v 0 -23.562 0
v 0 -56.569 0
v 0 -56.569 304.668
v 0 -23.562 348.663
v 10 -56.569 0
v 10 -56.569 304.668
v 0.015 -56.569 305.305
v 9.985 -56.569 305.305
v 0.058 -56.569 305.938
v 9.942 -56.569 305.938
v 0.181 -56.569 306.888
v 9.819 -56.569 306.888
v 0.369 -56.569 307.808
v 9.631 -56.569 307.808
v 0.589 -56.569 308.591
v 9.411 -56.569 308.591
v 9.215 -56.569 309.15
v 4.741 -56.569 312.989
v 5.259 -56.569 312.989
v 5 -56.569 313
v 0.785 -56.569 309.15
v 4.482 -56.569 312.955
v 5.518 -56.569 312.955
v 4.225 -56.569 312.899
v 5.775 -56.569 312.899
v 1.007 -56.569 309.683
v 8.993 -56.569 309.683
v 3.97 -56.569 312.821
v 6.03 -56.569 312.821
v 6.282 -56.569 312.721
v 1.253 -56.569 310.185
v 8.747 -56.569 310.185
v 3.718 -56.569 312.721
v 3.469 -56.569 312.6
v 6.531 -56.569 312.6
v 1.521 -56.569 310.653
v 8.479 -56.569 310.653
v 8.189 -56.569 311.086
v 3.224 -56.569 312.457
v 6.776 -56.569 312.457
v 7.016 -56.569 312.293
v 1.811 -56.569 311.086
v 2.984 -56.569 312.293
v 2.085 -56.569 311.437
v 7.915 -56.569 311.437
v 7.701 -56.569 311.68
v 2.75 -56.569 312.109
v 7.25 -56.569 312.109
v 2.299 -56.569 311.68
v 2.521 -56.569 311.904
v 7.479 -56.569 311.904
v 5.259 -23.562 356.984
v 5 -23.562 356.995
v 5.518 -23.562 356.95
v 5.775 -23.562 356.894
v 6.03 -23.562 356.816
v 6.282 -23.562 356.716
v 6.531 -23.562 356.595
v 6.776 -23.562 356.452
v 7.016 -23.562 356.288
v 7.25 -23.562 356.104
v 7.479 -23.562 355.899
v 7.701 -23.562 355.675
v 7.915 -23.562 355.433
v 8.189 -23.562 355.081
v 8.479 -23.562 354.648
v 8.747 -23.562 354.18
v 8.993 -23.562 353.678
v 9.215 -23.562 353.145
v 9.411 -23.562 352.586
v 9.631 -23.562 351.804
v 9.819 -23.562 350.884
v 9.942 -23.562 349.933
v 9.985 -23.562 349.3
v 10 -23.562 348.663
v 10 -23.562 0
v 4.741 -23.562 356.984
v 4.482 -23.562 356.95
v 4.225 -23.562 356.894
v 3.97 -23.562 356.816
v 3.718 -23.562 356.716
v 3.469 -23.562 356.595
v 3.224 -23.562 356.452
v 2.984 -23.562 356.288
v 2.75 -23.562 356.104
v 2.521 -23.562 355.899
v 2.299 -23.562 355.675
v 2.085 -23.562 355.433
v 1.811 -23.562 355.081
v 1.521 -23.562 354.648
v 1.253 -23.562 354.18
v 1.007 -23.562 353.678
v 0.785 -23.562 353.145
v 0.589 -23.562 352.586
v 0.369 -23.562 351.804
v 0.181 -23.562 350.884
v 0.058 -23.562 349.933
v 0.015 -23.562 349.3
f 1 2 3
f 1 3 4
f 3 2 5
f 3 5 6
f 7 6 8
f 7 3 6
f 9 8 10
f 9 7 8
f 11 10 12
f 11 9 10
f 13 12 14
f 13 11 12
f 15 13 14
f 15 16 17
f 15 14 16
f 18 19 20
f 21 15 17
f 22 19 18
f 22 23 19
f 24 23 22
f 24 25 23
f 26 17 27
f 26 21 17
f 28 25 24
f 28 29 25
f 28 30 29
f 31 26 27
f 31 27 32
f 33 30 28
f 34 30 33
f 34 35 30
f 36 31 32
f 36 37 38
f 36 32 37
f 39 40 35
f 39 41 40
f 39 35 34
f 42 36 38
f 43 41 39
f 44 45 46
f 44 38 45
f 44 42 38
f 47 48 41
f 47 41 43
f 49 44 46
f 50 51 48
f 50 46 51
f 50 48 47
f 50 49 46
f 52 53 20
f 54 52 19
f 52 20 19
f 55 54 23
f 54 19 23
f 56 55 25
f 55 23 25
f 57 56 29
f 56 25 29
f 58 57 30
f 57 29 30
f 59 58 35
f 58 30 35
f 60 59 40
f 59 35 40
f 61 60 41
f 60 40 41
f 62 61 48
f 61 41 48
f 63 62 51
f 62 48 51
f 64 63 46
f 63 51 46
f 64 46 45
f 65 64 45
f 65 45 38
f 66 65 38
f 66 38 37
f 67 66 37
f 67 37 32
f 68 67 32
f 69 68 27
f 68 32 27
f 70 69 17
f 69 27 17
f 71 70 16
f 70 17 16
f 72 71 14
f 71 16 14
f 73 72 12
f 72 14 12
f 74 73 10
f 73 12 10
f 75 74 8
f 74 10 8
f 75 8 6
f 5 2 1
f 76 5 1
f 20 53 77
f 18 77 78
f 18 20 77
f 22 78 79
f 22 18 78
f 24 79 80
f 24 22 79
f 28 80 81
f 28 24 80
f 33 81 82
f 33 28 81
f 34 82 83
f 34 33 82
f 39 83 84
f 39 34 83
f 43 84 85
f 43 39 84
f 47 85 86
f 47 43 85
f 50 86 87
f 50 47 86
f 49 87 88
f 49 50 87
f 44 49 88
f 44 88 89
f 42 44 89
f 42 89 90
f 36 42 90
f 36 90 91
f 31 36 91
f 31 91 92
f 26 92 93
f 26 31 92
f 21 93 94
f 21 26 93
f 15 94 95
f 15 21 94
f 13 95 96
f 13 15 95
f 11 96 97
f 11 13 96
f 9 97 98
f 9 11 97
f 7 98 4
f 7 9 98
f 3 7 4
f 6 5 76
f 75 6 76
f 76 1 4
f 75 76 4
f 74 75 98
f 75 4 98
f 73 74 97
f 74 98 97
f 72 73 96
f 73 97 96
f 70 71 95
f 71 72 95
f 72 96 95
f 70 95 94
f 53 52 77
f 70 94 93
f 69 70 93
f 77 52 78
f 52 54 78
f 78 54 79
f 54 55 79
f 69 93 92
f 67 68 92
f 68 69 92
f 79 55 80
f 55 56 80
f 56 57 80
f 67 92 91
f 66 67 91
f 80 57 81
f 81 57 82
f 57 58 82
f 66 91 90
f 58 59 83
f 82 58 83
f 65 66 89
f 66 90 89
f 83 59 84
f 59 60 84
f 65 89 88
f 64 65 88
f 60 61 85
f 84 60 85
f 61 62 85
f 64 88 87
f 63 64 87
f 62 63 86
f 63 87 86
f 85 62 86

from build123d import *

# Parameters (mm, degrees)
F0_W     = 14.4847853028
F0_H     = 313
F1_DEPTH = 10
F2_R     = 4.99999


# Not quite as in the source:
# - a fillet or chamfer is up to 0.001 mm smaller than in the source, because OpenCascade refuses the exact size


with BuildPart() as f1:
    # F0 (on Right) → F1 (new body)
    with BuildSketch(Plane.YZ):
        with Locations((-49.3265521361, 156.5)):
            Rectangle(F0_W, F0_H)
        Polygon((-42.0841594847, 313), (-42.0841594847, 0), (-23.5623567487, 0), (-23.5623567487, 356.9950582001), (-56.5689447875, 313), align=None)
    extrude(amount=F1_DEPTH)

    # F2 (radius 5 in the source; OpenCascade refuses exactly that, so slightly less here)
    f2_edges = [f1.edges().sort_by_distance(p)[0] for p in [
        (10, -40.065651, 334.997529),
        (0, -40.065651, 334.997529),
    ]]
    fillet(f2_edges, radius=F2_R)


solid = f1.part
